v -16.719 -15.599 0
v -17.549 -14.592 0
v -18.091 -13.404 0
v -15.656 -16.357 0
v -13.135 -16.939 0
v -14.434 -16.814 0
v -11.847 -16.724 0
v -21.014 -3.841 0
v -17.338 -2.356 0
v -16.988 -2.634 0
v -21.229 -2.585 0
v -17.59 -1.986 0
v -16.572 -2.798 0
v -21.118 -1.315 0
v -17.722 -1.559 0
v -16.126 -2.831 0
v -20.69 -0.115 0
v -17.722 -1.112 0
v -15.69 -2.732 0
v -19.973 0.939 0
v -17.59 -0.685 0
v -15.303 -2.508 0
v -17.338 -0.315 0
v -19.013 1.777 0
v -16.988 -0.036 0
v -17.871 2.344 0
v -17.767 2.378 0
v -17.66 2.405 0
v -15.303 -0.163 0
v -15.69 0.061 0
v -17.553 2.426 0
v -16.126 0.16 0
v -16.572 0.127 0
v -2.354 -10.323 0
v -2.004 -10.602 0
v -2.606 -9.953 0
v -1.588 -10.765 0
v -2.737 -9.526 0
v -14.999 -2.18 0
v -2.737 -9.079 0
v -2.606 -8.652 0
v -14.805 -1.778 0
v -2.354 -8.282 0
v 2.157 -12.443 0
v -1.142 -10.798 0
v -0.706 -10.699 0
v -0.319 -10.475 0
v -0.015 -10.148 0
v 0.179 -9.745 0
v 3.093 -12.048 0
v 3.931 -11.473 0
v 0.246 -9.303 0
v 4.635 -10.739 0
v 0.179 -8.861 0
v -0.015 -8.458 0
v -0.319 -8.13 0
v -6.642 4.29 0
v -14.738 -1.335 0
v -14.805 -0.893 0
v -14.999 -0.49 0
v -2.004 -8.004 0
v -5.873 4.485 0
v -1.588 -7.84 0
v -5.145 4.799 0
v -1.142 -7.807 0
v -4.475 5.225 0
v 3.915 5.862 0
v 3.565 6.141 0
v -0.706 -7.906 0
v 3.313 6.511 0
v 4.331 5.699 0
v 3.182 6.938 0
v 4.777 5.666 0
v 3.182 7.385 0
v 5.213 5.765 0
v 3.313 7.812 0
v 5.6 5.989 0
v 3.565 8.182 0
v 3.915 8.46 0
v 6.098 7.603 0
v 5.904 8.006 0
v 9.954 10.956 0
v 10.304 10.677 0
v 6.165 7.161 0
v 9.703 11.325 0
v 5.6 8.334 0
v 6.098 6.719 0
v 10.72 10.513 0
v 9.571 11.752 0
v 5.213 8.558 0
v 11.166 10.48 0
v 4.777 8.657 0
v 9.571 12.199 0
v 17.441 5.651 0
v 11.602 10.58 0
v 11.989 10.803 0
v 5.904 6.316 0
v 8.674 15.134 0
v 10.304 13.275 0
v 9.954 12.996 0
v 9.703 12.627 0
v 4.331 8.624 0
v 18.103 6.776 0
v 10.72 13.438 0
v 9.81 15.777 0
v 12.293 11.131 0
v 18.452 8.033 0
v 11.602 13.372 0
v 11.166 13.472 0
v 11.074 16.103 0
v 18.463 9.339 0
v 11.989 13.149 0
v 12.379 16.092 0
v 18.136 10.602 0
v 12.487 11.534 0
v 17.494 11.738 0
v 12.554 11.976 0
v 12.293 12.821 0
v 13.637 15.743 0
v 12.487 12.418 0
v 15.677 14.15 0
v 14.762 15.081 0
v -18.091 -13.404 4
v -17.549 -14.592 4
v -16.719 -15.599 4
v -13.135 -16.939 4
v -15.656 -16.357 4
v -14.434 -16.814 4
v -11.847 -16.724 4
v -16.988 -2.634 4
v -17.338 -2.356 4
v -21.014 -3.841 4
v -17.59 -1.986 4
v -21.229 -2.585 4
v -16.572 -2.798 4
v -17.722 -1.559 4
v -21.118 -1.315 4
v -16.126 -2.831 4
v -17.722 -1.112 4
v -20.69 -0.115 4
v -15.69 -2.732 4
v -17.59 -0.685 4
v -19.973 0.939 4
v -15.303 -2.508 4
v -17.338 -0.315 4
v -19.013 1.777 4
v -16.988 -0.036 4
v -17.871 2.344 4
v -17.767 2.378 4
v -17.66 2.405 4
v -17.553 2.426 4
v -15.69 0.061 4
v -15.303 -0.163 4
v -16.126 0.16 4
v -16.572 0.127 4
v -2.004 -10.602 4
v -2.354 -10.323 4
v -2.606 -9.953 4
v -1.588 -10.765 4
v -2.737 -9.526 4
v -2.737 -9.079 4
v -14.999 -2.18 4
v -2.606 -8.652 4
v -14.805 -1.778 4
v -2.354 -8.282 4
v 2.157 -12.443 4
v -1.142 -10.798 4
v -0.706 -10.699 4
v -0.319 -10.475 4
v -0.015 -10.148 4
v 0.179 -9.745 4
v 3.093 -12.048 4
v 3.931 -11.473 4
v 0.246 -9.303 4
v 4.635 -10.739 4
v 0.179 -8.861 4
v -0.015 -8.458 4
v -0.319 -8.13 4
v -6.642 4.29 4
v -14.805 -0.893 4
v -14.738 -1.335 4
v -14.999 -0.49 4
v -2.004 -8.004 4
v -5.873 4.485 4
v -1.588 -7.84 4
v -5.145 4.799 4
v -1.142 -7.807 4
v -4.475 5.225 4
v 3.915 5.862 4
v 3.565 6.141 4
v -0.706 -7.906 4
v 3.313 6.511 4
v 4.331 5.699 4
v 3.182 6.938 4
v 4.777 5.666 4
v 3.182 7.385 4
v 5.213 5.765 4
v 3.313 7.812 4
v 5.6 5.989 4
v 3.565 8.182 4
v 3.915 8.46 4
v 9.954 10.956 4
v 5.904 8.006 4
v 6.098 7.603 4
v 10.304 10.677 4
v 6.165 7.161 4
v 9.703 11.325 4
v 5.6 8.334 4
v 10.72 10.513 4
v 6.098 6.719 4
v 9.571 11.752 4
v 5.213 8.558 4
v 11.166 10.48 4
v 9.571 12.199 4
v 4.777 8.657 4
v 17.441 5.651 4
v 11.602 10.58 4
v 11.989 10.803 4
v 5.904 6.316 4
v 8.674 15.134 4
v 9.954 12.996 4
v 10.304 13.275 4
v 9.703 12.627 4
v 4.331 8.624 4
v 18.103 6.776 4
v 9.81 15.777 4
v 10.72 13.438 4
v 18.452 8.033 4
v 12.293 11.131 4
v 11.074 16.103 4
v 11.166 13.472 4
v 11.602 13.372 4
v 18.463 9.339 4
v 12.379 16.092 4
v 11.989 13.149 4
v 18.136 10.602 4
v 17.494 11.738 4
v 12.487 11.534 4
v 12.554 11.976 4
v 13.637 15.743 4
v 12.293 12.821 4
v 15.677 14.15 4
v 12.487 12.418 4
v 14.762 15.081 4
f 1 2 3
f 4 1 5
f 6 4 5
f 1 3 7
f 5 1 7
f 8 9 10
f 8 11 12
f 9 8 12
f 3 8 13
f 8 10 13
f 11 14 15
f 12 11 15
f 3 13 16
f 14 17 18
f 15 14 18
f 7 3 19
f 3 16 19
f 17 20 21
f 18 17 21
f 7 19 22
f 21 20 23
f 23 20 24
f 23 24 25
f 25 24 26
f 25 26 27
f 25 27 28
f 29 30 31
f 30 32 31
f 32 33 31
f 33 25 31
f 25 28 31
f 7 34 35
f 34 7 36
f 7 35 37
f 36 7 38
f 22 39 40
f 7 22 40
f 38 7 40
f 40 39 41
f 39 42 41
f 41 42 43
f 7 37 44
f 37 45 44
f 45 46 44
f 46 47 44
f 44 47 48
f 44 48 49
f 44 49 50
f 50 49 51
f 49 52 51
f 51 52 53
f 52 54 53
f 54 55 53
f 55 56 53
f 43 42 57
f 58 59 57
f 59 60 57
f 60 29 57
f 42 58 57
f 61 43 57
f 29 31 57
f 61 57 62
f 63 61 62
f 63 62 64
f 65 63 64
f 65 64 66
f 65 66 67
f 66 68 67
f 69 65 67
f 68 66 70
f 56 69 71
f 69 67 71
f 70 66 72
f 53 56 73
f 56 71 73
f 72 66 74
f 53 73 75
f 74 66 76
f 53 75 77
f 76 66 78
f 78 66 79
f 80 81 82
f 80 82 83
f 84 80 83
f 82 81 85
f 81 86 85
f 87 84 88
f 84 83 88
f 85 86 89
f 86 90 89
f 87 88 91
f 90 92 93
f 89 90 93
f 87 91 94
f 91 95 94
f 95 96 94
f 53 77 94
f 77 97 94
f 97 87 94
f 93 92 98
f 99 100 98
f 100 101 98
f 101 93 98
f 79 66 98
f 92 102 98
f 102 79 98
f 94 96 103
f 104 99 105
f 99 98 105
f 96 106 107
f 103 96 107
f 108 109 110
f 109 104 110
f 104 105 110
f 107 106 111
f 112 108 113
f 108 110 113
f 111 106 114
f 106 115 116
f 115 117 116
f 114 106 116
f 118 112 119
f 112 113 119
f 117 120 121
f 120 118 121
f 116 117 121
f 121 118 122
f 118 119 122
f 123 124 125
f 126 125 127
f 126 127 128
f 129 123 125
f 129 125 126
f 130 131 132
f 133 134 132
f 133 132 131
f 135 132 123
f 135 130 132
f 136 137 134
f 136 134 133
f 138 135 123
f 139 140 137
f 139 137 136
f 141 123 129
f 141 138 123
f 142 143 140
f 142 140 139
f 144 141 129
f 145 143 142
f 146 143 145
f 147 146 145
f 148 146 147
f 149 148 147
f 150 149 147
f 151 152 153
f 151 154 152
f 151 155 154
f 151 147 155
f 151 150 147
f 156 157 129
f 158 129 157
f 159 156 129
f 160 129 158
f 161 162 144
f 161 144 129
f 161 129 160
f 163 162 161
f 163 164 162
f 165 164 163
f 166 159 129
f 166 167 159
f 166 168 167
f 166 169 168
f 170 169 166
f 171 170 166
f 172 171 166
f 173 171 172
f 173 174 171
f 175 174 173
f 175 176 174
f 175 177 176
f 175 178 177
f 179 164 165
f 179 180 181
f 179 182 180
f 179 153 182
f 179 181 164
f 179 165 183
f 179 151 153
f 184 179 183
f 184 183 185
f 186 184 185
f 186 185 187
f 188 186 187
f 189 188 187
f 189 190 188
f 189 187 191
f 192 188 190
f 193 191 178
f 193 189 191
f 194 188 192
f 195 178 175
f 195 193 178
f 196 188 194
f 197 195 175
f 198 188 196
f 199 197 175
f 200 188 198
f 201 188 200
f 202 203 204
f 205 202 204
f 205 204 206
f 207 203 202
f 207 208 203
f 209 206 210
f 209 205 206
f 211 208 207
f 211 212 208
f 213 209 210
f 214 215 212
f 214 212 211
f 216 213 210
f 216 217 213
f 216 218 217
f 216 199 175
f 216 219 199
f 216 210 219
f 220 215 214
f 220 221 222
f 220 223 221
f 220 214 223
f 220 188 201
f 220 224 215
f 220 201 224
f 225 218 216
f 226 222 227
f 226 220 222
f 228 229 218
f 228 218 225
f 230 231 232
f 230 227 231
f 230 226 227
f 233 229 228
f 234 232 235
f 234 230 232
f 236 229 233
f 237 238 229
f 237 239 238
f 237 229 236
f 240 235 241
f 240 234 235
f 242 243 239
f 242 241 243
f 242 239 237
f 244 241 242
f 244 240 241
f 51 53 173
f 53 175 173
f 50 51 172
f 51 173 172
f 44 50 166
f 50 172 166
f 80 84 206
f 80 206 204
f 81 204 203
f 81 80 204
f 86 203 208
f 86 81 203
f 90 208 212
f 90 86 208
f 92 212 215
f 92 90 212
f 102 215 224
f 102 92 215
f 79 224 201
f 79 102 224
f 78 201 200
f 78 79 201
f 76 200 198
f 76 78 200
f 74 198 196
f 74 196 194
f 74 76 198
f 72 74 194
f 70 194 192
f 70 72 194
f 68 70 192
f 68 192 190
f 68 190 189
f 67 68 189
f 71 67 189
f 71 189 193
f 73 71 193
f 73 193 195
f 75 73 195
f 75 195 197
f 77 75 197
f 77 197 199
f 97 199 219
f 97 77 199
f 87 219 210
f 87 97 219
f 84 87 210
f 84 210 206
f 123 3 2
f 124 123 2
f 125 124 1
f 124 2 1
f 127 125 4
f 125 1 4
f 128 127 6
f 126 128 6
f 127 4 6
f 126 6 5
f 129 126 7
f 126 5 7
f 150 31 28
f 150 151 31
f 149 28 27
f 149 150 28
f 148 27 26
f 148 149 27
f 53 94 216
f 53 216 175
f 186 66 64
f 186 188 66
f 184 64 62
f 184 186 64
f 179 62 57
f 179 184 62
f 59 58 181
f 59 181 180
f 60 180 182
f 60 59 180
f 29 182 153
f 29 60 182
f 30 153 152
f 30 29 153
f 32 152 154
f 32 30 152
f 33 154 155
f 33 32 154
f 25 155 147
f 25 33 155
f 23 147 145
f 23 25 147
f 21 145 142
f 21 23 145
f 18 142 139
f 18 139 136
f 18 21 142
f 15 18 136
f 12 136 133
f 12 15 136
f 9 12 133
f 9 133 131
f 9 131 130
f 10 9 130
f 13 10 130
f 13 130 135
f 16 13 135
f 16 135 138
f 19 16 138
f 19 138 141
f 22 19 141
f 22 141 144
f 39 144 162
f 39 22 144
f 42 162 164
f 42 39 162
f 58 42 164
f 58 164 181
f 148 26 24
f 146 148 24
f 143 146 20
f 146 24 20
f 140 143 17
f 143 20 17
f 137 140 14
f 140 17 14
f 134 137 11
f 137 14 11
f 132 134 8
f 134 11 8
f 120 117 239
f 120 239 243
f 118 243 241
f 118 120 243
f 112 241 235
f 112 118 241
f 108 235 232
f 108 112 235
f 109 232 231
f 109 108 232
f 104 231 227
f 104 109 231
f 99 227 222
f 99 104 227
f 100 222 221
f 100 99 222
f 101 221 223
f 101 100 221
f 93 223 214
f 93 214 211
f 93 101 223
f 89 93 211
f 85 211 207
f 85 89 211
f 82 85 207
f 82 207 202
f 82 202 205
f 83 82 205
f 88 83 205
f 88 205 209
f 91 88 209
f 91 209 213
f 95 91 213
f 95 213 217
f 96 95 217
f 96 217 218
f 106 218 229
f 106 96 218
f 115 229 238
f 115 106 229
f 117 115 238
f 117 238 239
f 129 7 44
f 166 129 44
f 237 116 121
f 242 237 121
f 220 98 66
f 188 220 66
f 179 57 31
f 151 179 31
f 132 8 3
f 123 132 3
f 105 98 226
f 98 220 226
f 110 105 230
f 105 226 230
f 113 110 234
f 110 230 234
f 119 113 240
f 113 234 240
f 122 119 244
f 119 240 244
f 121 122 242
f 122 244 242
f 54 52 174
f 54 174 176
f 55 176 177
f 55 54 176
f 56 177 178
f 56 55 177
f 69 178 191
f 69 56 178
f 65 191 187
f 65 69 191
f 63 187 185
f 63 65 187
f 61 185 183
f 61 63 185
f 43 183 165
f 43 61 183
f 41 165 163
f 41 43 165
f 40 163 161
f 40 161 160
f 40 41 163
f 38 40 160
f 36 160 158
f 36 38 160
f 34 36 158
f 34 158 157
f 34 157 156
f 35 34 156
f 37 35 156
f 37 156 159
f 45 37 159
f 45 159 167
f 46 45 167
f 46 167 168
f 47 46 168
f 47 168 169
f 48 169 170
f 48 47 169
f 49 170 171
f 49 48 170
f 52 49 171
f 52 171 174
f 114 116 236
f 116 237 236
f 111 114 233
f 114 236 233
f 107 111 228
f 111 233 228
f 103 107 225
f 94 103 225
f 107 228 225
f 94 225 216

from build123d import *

# Parameters (mm, degrees)
SKETCH_1_R          = 1.5
EXTRUDE_1_DEPTH     = 4
FILLET_2_R          = 5
CUT_EXTRUDE_1_DEPTH = 5
FILLET_3_R          = 5
FILLET_4_R          = 2


with BuildPart() as part:
    # 草图1 → 凸台-拉伸1 (new body)
    with BuildSketch(Plane.XY):
        with BuildLine():
            Line((12.667454416, 18.14297047), (-5.445003471, 4.494254472))
            Line((-5.445003471, 4.494254472), (-17.69465686, 2.402060789))
            ThreePointArc((-17.69465686, 2.402060789), (-20.647536301, -0.032105177), (-21.014322116, -3.841321514))
            Line((-21.014322116, -3.841321514), (-18.090605069, -13.404369074))
            ThreePointArc((-18.090605069, -13.404369074), (-15.656439103, -16.357248515), (-11.847222766, -16.72403433))
            Line((-11.847222766, -16.72403433), (29.431618129, -4.103826174))
            Line((29.431618129, -4.103826174), (12.667454416, 18.14297047))
        make_face()
        with Locations((11.05402554, 11.9758622)):
            Circle(SKETCH_1_R, mode=Mode.SUBTRACT)
        with Locations((4.66494146, 7.161342014)):
            Circle(SKETCH_1_R, mode=Mode.SUBTRACT)
        with Locations((-16.238278615, -1.335446723)):
            Circle(SKETCH_1_R, mode=Mode.SUBTRACT)
        with Locations((-1.254161086, -9.302643338)):
            Circle(SKETCH_1_R, mode=Mode.SUBTRACT)
    extrude(amount=EXTRUDE_1_DEPTH)

    # 圆角2
    fillet_2_edges = [part.edges().sort_by_distance(p)[0] for p in [
        (-5.445003471, 4.494254472, 2),
        (12.667454416, 18.14297047, 2),
    ]]
    fillet(fillet_2_edges, radius=FILLET_2_R)

    # 草图2 → 切除-拉伸1 (cut, through all)
    with BuildSketch(Plane(origin=(0, 0, 0), x_dir=(-1, 0, 0), z_dir=(0, 0, -1))):
        Polygon((-19.802577759, 8.674341987), (-3.664326363, -11.981677845), (-29.431618129, -4.103826174), align=None)
    extrude(amount=-CUT_EXTRUDE_1_DEPTH, mode=Mode.SUBTRACT)

    # 圆角3
    fillet_3_edges = [part.edges().sort_by_distance(p)[0] for p in [
        (19.802577759, 8.674341987, 2),
        (3.664326363, -11.981677845, 2),
    ]]
    fillet(fillet_3_edges, radius=FILLET_3_R)

    # 圆角4
    fillet_4_edges = [part.edges().sort_by_distance(p)[0] for p in [
        (-17.69465686, 2.402060789, 2),
    ]]
    fillet(fillet_4_edges, radius=FILLET_4_R)


solid = part.part
